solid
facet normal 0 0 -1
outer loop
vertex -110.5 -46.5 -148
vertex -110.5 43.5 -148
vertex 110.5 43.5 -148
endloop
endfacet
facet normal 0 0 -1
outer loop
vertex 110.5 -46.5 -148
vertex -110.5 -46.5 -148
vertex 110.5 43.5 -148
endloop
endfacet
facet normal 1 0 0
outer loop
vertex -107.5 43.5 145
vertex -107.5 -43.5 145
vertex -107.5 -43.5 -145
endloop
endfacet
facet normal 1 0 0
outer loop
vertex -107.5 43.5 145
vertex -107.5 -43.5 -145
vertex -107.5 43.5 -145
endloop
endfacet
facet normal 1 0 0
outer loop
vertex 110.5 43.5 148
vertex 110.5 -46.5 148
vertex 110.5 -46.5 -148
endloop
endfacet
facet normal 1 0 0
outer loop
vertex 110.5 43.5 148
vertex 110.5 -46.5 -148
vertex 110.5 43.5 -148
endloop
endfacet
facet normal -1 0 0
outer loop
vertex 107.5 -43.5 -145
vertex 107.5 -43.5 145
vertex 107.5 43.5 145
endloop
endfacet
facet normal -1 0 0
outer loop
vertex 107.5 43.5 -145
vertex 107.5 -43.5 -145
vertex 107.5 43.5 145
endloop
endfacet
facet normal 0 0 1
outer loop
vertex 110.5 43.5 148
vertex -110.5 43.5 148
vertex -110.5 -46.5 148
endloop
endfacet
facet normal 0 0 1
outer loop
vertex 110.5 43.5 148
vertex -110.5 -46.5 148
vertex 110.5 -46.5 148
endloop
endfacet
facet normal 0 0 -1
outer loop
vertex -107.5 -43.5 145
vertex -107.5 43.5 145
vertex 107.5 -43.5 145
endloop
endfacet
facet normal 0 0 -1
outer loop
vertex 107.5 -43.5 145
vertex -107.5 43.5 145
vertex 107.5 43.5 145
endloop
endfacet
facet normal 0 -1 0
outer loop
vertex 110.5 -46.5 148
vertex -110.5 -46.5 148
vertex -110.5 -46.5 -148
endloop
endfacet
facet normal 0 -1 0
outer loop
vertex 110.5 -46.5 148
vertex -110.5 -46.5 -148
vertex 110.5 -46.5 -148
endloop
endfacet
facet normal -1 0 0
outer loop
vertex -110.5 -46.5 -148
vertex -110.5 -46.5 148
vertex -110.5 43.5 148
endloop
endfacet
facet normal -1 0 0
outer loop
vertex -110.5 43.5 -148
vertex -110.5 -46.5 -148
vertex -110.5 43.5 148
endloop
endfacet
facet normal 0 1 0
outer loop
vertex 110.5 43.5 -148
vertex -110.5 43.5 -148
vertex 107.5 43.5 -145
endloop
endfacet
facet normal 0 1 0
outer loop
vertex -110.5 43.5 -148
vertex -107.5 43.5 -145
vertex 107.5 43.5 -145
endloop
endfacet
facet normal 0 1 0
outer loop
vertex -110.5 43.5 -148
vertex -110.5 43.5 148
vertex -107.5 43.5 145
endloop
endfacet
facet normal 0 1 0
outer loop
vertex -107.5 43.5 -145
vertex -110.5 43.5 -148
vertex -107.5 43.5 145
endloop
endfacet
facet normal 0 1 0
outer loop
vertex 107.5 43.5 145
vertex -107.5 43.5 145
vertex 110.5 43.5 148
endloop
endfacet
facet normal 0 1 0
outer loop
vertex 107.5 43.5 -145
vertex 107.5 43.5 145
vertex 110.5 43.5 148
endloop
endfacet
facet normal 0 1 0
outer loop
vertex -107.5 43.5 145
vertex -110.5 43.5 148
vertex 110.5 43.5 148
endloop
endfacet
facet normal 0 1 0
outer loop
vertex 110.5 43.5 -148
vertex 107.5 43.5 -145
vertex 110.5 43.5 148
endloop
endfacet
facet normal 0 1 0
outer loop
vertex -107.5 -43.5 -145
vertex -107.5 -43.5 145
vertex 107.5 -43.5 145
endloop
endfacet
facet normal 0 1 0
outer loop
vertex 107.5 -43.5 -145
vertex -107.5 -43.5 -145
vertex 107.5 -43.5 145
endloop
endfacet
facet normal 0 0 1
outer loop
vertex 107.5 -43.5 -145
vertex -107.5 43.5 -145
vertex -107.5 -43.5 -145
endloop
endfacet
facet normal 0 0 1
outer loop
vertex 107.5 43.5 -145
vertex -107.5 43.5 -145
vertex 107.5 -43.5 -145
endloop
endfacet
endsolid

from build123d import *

# Parameters (mm, degrees)
SKIZZE1_W                       = 215
SKIZZE1_H                       = 87
AUFSATZ_LINEAR_AUSTRAGEN1_DEPTH = 145
WANDUNG1_T                      = 3


with BuildPart() as part:
    # Skizze1 → Aufsatz-Linear austragen1 (new, symmetric)
    with BuildSketch(Plane.XY):
        Rectangle(SKIZZE1_W, SKIZZE1_H)
    extrude(amount=AUFSATZ_LINEAR_AUSTRAGEN1_DEPTH, both=True)

    # Wandung1
    wandung1_openings = [part.faces().sort_by_distance(p)[0] for p in [
        (0, 43.5, 0),
    ]]
    offset(amount=WANDUNG1_T, openings=wandung1_openings, kind=Kind.INTERSECTION)


solid = part.part
